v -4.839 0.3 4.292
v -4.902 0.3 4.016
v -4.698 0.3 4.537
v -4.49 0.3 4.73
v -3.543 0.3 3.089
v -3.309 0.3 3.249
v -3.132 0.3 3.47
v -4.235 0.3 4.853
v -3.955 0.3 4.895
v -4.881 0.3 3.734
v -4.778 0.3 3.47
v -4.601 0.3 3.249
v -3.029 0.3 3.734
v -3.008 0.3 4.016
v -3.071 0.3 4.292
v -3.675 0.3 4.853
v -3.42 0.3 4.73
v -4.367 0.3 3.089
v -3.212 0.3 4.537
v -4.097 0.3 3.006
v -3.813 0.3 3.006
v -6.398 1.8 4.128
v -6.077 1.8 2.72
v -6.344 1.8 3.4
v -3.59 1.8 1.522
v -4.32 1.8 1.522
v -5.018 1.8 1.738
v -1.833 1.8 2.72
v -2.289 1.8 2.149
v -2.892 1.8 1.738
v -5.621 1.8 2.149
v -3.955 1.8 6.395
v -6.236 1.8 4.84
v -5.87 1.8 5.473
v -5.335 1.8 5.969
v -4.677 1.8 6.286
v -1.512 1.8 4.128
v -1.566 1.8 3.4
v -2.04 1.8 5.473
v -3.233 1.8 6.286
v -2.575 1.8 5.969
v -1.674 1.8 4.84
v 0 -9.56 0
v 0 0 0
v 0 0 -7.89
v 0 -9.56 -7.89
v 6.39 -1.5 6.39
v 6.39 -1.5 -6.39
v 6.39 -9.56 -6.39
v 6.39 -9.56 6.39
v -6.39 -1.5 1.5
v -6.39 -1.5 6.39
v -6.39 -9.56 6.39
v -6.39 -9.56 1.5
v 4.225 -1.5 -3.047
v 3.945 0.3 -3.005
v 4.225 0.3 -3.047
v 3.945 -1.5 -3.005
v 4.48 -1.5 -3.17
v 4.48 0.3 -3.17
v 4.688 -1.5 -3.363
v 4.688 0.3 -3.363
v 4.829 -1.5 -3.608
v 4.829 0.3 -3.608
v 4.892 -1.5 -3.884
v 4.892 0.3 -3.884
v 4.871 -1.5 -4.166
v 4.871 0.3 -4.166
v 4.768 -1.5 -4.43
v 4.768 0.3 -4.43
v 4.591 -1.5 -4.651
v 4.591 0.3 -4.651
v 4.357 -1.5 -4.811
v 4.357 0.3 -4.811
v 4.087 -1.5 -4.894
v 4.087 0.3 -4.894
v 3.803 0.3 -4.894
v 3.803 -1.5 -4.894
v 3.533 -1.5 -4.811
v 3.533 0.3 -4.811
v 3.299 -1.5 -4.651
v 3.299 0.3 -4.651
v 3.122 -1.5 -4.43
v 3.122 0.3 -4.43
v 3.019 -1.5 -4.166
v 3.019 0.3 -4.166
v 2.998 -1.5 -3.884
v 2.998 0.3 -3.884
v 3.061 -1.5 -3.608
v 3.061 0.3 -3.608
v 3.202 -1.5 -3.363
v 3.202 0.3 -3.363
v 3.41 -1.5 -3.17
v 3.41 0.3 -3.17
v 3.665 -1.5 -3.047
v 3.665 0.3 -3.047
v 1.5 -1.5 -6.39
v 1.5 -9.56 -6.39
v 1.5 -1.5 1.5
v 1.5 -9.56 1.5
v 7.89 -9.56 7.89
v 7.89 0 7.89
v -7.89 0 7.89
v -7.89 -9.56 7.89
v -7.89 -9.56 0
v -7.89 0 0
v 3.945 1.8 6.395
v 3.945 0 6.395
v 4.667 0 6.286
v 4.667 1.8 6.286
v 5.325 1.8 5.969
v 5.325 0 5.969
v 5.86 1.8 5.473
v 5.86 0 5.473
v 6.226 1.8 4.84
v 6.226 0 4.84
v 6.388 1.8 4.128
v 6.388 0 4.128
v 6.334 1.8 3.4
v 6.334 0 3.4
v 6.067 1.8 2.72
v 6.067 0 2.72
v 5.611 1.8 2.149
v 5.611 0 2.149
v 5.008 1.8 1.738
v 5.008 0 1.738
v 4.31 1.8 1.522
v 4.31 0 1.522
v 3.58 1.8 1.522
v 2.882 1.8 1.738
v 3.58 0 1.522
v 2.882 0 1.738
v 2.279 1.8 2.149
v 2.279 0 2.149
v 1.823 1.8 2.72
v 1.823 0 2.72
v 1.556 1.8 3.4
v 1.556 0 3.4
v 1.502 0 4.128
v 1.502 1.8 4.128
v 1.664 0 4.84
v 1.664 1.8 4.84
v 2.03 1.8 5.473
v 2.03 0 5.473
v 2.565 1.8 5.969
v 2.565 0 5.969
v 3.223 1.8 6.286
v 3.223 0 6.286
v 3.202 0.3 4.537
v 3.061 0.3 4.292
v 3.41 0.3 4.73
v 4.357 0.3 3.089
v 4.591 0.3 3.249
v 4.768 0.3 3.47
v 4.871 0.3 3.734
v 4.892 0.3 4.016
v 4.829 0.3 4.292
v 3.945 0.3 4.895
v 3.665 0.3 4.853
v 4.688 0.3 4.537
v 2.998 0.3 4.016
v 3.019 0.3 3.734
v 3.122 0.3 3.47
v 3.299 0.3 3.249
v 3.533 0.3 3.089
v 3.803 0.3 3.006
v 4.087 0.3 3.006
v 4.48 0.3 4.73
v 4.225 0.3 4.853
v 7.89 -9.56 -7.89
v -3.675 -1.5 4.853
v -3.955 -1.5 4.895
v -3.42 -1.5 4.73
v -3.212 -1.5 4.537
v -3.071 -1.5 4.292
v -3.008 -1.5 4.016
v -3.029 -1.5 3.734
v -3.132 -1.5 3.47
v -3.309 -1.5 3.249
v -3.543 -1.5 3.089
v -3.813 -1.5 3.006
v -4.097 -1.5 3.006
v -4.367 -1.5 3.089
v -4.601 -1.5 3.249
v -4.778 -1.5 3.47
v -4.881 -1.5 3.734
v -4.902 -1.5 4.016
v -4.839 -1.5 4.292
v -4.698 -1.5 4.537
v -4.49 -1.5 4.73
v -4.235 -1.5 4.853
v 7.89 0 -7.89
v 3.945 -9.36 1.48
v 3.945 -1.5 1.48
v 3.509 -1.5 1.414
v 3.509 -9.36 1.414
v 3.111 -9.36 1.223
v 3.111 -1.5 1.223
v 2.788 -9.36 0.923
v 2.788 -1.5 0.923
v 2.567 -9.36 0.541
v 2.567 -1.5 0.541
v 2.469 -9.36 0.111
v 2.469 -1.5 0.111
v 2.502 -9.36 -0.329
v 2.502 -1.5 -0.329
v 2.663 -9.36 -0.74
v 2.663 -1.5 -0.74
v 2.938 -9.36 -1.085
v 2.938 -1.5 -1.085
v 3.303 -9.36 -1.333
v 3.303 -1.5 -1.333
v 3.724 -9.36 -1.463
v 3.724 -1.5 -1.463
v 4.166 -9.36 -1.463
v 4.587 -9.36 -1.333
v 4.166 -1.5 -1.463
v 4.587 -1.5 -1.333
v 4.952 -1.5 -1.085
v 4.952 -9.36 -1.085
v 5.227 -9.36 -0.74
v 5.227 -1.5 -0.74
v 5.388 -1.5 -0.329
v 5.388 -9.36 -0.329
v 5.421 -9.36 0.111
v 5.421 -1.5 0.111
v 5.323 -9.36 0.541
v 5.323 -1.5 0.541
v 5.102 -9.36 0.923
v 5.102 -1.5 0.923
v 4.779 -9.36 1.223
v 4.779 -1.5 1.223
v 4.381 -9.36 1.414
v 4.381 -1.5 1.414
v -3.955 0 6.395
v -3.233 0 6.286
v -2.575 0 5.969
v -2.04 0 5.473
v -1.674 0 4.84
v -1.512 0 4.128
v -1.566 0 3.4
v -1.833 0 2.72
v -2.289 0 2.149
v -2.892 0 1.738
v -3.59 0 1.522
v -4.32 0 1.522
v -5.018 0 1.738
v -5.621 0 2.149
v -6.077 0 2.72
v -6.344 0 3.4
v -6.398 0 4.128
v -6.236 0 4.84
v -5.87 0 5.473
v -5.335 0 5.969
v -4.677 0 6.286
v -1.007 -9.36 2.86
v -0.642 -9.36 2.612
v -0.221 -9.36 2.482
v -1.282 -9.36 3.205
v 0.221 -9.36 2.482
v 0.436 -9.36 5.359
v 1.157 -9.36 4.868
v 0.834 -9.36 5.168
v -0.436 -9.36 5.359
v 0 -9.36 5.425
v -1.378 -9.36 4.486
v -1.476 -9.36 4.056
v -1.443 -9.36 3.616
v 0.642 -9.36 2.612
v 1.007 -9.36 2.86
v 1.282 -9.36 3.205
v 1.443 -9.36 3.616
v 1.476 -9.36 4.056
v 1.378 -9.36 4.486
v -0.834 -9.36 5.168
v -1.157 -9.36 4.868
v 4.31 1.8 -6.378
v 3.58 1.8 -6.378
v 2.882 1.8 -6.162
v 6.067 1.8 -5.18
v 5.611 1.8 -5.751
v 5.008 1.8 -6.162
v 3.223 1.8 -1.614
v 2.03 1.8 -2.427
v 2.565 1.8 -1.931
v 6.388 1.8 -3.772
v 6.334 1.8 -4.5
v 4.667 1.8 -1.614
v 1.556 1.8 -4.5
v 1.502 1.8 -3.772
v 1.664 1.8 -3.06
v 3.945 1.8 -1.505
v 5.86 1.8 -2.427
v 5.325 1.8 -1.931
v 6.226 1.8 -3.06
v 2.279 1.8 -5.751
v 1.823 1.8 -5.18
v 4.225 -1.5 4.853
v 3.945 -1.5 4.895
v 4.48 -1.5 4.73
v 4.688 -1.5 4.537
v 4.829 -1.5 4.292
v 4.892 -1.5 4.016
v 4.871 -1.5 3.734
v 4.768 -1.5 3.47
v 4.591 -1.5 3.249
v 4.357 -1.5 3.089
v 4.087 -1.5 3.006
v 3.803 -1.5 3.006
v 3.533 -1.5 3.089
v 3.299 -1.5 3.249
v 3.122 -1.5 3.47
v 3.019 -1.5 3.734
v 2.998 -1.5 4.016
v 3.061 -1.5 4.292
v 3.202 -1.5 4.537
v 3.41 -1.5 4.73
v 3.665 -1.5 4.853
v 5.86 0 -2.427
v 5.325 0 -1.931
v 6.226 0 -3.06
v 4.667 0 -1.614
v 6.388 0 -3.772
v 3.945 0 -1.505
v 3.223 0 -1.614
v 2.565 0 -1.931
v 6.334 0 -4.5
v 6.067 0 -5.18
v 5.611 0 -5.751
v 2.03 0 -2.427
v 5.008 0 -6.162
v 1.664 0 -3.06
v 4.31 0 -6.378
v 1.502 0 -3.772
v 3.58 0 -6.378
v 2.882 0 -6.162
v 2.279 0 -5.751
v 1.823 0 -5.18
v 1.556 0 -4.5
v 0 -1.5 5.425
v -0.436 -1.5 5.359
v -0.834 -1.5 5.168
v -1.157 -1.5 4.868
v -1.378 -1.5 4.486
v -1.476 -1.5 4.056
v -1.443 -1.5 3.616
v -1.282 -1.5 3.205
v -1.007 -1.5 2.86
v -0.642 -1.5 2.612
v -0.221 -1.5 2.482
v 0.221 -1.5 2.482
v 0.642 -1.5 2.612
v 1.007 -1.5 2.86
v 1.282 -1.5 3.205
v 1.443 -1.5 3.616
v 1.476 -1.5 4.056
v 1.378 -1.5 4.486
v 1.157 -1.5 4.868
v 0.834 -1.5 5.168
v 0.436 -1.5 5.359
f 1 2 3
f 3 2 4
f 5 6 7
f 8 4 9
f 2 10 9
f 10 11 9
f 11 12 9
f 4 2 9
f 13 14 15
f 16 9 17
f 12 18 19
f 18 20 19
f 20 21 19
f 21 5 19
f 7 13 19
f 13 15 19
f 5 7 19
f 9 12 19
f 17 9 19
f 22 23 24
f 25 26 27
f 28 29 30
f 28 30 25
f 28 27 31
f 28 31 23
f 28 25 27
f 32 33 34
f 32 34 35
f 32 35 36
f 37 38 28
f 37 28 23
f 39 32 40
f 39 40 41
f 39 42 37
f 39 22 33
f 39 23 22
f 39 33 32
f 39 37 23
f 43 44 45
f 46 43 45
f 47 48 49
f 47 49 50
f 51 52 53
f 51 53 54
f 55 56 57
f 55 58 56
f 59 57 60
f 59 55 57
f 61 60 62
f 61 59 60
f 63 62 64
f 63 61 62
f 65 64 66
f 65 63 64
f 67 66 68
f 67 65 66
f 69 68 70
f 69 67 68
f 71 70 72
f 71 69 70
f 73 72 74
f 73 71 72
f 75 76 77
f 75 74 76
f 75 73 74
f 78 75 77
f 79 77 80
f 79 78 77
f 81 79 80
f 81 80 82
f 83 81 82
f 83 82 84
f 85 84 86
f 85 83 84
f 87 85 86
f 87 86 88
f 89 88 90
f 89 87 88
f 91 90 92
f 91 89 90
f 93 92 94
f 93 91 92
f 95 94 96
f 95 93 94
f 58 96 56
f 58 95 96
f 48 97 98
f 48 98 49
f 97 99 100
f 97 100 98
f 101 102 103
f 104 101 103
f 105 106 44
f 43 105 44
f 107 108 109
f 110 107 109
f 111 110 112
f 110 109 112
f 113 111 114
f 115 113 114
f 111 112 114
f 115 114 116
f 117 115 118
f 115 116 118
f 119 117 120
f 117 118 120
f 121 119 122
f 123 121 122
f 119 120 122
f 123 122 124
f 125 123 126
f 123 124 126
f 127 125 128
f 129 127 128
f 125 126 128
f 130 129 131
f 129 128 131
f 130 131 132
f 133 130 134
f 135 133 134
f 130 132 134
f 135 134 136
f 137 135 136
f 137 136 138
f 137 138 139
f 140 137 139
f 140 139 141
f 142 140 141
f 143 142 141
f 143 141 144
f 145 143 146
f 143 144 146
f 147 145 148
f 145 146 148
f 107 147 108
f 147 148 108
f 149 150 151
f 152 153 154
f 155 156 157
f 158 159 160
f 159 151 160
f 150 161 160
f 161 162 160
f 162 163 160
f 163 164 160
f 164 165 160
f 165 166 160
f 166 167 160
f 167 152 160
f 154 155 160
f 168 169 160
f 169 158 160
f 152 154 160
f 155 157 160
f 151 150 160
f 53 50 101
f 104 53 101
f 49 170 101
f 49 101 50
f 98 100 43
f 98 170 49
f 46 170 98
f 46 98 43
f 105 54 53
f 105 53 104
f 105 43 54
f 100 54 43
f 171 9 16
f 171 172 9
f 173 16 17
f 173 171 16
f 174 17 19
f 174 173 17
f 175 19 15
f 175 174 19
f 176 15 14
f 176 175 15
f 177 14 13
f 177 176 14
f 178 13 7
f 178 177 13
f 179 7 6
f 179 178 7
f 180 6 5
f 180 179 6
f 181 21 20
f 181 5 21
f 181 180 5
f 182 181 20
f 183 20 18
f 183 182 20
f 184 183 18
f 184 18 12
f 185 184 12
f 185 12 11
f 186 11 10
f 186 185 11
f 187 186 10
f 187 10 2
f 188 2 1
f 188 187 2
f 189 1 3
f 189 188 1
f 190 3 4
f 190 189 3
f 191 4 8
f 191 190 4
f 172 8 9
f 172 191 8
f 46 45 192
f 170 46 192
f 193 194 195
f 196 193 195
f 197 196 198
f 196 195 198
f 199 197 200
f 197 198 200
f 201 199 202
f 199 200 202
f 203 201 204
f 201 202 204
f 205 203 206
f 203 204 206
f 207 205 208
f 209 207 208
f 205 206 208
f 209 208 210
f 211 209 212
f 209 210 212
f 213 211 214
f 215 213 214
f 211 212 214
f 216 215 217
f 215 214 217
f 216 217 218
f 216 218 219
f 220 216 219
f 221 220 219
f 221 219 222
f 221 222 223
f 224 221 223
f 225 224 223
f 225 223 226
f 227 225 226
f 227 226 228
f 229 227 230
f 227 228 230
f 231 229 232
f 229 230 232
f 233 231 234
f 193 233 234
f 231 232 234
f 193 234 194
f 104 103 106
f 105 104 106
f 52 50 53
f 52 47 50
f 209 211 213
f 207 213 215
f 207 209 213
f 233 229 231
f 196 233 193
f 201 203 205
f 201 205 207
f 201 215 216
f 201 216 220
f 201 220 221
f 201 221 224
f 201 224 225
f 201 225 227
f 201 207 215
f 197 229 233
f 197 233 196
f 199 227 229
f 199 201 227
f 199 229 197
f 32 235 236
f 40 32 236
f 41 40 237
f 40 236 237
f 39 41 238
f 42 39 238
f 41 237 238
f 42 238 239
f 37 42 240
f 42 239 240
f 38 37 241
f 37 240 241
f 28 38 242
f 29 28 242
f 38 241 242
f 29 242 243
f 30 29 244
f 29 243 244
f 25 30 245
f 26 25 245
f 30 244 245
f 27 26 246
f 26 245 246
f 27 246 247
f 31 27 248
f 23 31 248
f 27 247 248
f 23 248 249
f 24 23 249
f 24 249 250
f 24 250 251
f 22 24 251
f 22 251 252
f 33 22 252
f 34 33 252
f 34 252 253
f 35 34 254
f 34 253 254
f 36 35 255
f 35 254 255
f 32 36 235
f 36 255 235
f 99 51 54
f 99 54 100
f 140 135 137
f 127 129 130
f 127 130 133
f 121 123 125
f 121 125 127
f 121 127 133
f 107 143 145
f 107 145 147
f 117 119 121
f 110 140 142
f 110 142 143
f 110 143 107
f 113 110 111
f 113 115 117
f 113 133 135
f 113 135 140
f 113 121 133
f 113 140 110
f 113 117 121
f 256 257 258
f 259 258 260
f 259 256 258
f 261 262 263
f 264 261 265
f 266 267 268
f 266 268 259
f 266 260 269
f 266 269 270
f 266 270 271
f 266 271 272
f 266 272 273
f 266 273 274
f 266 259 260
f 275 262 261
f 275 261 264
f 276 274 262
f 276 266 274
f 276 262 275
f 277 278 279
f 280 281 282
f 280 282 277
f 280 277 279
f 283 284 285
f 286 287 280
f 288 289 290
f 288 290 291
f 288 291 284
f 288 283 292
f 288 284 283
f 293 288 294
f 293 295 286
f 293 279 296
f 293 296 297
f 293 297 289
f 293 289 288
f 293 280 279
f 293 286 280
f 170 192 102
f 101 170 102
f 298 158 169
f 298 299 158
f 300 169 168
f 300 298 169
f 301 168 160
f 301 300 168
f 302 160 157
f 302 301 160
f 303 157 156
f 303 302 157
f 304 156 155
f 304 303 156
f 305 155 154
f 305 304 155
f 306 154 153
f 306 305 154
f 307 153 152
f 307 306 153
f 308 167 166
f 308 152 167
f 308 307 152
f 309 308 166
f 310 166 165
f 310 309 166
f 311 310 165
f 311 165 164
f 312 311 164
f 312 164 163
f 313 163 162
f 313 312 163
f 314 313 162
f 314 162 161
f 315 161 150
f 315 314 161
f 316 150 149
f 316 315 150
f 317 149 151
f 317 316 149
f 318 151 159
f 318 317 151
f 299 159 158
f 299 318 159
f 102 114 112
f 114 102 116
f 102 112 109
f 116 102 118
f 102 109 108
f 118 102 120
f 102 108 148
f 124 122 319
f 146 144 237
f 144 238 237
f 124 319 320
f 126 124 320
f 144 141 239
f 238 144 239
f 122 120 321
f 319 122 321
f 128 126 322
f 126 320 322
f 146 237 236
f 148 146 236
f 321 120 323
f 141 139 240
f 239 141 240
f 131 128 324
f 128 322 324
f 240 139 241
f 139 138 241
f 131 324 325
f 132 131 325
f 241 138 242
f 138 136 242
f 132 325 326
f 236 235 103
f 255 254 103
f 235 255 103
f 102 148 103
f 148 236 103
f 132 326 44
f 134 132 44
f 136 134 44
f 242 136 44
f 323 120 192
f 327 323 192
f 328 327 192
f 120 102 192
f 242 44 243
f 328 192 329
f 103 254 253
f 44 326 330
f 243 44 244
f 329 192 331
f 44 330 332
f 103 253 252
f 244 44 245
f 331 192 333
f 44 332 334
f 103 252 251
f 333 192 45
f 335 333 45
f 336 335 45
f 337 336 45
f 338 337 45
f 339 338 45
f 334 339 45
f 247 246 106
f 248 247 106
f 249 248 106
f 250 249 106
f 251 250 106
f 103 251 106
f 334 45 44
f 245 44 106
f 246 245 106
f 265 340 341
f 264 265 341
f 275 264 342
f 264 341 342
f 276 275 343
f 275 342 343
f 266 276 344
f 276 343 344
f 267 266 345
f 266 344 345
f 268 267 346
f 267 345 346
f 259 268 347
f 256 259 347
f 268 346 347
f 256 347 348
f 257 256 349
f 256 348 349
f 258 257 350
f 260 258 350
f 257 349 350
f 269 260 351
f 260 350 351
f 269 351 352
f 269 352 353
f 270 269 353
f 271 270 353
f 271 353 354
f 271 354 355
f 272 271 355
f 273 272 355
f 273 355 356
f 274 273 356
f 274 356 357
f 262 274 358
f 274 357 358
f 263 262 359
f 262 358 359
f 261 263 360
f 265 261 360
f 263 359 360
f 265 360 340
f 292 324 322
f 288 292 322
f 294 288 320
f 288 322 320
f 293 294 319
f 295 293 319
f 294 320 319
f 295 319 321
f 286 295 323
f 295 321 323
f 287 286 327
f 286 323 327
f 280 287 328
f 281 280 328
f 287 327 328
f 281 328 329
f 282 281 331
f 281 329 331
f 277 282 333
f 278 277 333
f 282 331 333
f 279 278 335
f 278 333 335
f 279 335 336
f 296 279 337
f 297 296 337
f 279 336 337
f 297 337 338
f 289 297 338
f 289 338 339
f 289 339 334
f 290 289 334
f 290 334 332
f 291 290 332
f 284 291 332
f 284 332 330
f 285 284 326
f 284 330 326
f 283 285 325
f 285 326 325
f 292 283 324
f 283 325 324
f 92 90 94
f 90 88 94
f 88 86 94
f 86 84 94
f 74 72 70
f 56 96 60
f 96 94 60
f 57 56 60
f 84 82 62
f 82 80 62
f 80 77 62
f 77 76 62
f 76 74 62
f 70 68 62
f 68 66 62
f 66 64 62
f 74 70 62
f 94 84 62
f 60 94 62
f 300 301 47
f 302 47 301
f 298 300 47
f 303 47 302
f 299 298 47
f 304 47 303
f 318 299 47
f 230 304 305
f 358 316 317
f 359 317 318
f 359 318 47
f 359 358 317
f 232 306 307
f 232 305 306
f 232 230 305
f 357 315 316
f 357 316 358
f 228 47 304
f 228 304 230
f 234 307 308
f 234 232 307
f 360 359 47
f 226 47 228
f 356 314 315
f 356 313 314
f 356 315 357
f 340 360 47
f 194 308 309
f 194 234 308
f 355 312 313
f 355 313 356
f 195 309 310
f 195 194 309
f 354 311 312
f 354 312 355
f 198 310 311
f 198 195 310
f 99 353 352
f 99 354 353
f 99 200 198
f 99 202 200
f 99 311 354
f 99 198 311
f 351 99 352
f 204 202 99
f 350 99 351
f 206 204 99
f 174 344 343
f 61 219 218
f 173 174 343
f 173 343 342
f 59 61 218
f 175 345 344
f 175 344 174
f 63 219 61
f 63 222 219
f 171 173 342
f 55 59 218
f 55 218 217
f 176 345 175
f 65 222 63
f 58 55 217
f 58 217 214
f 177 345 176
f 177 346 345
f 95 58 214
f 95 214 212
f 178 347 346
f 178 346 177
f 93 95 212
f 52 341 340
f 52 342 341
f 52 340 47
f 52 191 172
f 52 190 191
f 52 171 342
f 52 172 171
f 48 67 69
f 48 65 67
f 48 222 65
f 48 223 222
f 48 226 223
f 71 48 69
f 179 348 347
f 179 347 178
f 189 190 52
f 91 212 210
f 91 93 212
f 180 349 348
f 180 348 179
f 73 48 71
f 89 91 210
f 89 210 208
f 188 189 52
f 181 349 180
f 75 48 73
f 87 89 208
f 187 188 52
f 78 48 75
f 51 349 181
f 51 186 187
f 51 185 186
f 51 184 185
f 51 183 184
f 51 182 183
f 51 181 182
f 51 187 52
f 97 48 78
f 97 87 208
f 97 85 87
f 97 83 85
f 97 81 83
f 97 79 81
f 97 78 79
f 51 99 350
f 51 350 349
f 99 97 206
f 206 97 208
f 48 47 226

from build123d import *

# Parameters (mm, degrees)
BOSS_EXTRUDE1_DEPTH = 9.56
SKETCH2_R           = 2.45
BOSS_EXTRUDE2_DEPTH = 1.8
SHELL1_T            = -1.5
SKETCH3_R           = 1.48
BOSS_EXTRUDE4_DEPTH = 7.86


with BuildPart() as part:
    # Sketch1 → Boss-Extrude1 (new body)
    with BuildSketch(Plane(origin=(0, 0, 0), x_dir=(1, 0, 0), z_dir=(0, 1, 0))):
        Polygon((0, 0), (0, 7.89), (7.89, 7.89), (7.89, -7.89), (-7.89, -7.89), (-7.89, 0), align=None)
    extrude(amount=-BOSS_EXTRUDE1_DEPTH)

    # Sketch2 → Boss-Extrude2 (add)
    with BuildSketch(Plane(origin=(0, 0, 0), x_dir=(1, 0, 0), z_dir=(0, 1, 0))):
        with Locations(Location((3.945, -3.945, 0), (0, 0, 270))):
            Circle(SKETCH2_R)
        with Locations(Location((3.945, 3.955, 0), (0, 0, 270))):
            Circle(SKETCH2_R)
        with Locations(Location((-3.955, -3.945, 0), (0, 0, 270))):
            Circle(SKETCH2_R)
    extrude(amount=BOSS_EXTRUDE2_DEPTH)

    # Shell1
    shell1_openings = [part.faces().sort_by_distance(p)[0] for p in [
        (1.315, -9.56, 1.315),
    ]]
    offset(amount=SHELL1_T, openings=shell1_openings, kind=Kind.INTERSECTION)

    # Sketch3 → Boss-Extrude4 (add)
    with BuildSketch(Plane.XZ.offset(1.5)):
        with Locations(Location((0, 3.945, 0), (0, 0, 90))):
            Circle(SKETCH3_R)
        with Locations(Location((3.945, 0, 0), (0, 0, 90))):
            Circle(SKETCH3_R)
    extrude(amount=BOSS_EXTRUDE4_DEPTH)


solid = part.part
